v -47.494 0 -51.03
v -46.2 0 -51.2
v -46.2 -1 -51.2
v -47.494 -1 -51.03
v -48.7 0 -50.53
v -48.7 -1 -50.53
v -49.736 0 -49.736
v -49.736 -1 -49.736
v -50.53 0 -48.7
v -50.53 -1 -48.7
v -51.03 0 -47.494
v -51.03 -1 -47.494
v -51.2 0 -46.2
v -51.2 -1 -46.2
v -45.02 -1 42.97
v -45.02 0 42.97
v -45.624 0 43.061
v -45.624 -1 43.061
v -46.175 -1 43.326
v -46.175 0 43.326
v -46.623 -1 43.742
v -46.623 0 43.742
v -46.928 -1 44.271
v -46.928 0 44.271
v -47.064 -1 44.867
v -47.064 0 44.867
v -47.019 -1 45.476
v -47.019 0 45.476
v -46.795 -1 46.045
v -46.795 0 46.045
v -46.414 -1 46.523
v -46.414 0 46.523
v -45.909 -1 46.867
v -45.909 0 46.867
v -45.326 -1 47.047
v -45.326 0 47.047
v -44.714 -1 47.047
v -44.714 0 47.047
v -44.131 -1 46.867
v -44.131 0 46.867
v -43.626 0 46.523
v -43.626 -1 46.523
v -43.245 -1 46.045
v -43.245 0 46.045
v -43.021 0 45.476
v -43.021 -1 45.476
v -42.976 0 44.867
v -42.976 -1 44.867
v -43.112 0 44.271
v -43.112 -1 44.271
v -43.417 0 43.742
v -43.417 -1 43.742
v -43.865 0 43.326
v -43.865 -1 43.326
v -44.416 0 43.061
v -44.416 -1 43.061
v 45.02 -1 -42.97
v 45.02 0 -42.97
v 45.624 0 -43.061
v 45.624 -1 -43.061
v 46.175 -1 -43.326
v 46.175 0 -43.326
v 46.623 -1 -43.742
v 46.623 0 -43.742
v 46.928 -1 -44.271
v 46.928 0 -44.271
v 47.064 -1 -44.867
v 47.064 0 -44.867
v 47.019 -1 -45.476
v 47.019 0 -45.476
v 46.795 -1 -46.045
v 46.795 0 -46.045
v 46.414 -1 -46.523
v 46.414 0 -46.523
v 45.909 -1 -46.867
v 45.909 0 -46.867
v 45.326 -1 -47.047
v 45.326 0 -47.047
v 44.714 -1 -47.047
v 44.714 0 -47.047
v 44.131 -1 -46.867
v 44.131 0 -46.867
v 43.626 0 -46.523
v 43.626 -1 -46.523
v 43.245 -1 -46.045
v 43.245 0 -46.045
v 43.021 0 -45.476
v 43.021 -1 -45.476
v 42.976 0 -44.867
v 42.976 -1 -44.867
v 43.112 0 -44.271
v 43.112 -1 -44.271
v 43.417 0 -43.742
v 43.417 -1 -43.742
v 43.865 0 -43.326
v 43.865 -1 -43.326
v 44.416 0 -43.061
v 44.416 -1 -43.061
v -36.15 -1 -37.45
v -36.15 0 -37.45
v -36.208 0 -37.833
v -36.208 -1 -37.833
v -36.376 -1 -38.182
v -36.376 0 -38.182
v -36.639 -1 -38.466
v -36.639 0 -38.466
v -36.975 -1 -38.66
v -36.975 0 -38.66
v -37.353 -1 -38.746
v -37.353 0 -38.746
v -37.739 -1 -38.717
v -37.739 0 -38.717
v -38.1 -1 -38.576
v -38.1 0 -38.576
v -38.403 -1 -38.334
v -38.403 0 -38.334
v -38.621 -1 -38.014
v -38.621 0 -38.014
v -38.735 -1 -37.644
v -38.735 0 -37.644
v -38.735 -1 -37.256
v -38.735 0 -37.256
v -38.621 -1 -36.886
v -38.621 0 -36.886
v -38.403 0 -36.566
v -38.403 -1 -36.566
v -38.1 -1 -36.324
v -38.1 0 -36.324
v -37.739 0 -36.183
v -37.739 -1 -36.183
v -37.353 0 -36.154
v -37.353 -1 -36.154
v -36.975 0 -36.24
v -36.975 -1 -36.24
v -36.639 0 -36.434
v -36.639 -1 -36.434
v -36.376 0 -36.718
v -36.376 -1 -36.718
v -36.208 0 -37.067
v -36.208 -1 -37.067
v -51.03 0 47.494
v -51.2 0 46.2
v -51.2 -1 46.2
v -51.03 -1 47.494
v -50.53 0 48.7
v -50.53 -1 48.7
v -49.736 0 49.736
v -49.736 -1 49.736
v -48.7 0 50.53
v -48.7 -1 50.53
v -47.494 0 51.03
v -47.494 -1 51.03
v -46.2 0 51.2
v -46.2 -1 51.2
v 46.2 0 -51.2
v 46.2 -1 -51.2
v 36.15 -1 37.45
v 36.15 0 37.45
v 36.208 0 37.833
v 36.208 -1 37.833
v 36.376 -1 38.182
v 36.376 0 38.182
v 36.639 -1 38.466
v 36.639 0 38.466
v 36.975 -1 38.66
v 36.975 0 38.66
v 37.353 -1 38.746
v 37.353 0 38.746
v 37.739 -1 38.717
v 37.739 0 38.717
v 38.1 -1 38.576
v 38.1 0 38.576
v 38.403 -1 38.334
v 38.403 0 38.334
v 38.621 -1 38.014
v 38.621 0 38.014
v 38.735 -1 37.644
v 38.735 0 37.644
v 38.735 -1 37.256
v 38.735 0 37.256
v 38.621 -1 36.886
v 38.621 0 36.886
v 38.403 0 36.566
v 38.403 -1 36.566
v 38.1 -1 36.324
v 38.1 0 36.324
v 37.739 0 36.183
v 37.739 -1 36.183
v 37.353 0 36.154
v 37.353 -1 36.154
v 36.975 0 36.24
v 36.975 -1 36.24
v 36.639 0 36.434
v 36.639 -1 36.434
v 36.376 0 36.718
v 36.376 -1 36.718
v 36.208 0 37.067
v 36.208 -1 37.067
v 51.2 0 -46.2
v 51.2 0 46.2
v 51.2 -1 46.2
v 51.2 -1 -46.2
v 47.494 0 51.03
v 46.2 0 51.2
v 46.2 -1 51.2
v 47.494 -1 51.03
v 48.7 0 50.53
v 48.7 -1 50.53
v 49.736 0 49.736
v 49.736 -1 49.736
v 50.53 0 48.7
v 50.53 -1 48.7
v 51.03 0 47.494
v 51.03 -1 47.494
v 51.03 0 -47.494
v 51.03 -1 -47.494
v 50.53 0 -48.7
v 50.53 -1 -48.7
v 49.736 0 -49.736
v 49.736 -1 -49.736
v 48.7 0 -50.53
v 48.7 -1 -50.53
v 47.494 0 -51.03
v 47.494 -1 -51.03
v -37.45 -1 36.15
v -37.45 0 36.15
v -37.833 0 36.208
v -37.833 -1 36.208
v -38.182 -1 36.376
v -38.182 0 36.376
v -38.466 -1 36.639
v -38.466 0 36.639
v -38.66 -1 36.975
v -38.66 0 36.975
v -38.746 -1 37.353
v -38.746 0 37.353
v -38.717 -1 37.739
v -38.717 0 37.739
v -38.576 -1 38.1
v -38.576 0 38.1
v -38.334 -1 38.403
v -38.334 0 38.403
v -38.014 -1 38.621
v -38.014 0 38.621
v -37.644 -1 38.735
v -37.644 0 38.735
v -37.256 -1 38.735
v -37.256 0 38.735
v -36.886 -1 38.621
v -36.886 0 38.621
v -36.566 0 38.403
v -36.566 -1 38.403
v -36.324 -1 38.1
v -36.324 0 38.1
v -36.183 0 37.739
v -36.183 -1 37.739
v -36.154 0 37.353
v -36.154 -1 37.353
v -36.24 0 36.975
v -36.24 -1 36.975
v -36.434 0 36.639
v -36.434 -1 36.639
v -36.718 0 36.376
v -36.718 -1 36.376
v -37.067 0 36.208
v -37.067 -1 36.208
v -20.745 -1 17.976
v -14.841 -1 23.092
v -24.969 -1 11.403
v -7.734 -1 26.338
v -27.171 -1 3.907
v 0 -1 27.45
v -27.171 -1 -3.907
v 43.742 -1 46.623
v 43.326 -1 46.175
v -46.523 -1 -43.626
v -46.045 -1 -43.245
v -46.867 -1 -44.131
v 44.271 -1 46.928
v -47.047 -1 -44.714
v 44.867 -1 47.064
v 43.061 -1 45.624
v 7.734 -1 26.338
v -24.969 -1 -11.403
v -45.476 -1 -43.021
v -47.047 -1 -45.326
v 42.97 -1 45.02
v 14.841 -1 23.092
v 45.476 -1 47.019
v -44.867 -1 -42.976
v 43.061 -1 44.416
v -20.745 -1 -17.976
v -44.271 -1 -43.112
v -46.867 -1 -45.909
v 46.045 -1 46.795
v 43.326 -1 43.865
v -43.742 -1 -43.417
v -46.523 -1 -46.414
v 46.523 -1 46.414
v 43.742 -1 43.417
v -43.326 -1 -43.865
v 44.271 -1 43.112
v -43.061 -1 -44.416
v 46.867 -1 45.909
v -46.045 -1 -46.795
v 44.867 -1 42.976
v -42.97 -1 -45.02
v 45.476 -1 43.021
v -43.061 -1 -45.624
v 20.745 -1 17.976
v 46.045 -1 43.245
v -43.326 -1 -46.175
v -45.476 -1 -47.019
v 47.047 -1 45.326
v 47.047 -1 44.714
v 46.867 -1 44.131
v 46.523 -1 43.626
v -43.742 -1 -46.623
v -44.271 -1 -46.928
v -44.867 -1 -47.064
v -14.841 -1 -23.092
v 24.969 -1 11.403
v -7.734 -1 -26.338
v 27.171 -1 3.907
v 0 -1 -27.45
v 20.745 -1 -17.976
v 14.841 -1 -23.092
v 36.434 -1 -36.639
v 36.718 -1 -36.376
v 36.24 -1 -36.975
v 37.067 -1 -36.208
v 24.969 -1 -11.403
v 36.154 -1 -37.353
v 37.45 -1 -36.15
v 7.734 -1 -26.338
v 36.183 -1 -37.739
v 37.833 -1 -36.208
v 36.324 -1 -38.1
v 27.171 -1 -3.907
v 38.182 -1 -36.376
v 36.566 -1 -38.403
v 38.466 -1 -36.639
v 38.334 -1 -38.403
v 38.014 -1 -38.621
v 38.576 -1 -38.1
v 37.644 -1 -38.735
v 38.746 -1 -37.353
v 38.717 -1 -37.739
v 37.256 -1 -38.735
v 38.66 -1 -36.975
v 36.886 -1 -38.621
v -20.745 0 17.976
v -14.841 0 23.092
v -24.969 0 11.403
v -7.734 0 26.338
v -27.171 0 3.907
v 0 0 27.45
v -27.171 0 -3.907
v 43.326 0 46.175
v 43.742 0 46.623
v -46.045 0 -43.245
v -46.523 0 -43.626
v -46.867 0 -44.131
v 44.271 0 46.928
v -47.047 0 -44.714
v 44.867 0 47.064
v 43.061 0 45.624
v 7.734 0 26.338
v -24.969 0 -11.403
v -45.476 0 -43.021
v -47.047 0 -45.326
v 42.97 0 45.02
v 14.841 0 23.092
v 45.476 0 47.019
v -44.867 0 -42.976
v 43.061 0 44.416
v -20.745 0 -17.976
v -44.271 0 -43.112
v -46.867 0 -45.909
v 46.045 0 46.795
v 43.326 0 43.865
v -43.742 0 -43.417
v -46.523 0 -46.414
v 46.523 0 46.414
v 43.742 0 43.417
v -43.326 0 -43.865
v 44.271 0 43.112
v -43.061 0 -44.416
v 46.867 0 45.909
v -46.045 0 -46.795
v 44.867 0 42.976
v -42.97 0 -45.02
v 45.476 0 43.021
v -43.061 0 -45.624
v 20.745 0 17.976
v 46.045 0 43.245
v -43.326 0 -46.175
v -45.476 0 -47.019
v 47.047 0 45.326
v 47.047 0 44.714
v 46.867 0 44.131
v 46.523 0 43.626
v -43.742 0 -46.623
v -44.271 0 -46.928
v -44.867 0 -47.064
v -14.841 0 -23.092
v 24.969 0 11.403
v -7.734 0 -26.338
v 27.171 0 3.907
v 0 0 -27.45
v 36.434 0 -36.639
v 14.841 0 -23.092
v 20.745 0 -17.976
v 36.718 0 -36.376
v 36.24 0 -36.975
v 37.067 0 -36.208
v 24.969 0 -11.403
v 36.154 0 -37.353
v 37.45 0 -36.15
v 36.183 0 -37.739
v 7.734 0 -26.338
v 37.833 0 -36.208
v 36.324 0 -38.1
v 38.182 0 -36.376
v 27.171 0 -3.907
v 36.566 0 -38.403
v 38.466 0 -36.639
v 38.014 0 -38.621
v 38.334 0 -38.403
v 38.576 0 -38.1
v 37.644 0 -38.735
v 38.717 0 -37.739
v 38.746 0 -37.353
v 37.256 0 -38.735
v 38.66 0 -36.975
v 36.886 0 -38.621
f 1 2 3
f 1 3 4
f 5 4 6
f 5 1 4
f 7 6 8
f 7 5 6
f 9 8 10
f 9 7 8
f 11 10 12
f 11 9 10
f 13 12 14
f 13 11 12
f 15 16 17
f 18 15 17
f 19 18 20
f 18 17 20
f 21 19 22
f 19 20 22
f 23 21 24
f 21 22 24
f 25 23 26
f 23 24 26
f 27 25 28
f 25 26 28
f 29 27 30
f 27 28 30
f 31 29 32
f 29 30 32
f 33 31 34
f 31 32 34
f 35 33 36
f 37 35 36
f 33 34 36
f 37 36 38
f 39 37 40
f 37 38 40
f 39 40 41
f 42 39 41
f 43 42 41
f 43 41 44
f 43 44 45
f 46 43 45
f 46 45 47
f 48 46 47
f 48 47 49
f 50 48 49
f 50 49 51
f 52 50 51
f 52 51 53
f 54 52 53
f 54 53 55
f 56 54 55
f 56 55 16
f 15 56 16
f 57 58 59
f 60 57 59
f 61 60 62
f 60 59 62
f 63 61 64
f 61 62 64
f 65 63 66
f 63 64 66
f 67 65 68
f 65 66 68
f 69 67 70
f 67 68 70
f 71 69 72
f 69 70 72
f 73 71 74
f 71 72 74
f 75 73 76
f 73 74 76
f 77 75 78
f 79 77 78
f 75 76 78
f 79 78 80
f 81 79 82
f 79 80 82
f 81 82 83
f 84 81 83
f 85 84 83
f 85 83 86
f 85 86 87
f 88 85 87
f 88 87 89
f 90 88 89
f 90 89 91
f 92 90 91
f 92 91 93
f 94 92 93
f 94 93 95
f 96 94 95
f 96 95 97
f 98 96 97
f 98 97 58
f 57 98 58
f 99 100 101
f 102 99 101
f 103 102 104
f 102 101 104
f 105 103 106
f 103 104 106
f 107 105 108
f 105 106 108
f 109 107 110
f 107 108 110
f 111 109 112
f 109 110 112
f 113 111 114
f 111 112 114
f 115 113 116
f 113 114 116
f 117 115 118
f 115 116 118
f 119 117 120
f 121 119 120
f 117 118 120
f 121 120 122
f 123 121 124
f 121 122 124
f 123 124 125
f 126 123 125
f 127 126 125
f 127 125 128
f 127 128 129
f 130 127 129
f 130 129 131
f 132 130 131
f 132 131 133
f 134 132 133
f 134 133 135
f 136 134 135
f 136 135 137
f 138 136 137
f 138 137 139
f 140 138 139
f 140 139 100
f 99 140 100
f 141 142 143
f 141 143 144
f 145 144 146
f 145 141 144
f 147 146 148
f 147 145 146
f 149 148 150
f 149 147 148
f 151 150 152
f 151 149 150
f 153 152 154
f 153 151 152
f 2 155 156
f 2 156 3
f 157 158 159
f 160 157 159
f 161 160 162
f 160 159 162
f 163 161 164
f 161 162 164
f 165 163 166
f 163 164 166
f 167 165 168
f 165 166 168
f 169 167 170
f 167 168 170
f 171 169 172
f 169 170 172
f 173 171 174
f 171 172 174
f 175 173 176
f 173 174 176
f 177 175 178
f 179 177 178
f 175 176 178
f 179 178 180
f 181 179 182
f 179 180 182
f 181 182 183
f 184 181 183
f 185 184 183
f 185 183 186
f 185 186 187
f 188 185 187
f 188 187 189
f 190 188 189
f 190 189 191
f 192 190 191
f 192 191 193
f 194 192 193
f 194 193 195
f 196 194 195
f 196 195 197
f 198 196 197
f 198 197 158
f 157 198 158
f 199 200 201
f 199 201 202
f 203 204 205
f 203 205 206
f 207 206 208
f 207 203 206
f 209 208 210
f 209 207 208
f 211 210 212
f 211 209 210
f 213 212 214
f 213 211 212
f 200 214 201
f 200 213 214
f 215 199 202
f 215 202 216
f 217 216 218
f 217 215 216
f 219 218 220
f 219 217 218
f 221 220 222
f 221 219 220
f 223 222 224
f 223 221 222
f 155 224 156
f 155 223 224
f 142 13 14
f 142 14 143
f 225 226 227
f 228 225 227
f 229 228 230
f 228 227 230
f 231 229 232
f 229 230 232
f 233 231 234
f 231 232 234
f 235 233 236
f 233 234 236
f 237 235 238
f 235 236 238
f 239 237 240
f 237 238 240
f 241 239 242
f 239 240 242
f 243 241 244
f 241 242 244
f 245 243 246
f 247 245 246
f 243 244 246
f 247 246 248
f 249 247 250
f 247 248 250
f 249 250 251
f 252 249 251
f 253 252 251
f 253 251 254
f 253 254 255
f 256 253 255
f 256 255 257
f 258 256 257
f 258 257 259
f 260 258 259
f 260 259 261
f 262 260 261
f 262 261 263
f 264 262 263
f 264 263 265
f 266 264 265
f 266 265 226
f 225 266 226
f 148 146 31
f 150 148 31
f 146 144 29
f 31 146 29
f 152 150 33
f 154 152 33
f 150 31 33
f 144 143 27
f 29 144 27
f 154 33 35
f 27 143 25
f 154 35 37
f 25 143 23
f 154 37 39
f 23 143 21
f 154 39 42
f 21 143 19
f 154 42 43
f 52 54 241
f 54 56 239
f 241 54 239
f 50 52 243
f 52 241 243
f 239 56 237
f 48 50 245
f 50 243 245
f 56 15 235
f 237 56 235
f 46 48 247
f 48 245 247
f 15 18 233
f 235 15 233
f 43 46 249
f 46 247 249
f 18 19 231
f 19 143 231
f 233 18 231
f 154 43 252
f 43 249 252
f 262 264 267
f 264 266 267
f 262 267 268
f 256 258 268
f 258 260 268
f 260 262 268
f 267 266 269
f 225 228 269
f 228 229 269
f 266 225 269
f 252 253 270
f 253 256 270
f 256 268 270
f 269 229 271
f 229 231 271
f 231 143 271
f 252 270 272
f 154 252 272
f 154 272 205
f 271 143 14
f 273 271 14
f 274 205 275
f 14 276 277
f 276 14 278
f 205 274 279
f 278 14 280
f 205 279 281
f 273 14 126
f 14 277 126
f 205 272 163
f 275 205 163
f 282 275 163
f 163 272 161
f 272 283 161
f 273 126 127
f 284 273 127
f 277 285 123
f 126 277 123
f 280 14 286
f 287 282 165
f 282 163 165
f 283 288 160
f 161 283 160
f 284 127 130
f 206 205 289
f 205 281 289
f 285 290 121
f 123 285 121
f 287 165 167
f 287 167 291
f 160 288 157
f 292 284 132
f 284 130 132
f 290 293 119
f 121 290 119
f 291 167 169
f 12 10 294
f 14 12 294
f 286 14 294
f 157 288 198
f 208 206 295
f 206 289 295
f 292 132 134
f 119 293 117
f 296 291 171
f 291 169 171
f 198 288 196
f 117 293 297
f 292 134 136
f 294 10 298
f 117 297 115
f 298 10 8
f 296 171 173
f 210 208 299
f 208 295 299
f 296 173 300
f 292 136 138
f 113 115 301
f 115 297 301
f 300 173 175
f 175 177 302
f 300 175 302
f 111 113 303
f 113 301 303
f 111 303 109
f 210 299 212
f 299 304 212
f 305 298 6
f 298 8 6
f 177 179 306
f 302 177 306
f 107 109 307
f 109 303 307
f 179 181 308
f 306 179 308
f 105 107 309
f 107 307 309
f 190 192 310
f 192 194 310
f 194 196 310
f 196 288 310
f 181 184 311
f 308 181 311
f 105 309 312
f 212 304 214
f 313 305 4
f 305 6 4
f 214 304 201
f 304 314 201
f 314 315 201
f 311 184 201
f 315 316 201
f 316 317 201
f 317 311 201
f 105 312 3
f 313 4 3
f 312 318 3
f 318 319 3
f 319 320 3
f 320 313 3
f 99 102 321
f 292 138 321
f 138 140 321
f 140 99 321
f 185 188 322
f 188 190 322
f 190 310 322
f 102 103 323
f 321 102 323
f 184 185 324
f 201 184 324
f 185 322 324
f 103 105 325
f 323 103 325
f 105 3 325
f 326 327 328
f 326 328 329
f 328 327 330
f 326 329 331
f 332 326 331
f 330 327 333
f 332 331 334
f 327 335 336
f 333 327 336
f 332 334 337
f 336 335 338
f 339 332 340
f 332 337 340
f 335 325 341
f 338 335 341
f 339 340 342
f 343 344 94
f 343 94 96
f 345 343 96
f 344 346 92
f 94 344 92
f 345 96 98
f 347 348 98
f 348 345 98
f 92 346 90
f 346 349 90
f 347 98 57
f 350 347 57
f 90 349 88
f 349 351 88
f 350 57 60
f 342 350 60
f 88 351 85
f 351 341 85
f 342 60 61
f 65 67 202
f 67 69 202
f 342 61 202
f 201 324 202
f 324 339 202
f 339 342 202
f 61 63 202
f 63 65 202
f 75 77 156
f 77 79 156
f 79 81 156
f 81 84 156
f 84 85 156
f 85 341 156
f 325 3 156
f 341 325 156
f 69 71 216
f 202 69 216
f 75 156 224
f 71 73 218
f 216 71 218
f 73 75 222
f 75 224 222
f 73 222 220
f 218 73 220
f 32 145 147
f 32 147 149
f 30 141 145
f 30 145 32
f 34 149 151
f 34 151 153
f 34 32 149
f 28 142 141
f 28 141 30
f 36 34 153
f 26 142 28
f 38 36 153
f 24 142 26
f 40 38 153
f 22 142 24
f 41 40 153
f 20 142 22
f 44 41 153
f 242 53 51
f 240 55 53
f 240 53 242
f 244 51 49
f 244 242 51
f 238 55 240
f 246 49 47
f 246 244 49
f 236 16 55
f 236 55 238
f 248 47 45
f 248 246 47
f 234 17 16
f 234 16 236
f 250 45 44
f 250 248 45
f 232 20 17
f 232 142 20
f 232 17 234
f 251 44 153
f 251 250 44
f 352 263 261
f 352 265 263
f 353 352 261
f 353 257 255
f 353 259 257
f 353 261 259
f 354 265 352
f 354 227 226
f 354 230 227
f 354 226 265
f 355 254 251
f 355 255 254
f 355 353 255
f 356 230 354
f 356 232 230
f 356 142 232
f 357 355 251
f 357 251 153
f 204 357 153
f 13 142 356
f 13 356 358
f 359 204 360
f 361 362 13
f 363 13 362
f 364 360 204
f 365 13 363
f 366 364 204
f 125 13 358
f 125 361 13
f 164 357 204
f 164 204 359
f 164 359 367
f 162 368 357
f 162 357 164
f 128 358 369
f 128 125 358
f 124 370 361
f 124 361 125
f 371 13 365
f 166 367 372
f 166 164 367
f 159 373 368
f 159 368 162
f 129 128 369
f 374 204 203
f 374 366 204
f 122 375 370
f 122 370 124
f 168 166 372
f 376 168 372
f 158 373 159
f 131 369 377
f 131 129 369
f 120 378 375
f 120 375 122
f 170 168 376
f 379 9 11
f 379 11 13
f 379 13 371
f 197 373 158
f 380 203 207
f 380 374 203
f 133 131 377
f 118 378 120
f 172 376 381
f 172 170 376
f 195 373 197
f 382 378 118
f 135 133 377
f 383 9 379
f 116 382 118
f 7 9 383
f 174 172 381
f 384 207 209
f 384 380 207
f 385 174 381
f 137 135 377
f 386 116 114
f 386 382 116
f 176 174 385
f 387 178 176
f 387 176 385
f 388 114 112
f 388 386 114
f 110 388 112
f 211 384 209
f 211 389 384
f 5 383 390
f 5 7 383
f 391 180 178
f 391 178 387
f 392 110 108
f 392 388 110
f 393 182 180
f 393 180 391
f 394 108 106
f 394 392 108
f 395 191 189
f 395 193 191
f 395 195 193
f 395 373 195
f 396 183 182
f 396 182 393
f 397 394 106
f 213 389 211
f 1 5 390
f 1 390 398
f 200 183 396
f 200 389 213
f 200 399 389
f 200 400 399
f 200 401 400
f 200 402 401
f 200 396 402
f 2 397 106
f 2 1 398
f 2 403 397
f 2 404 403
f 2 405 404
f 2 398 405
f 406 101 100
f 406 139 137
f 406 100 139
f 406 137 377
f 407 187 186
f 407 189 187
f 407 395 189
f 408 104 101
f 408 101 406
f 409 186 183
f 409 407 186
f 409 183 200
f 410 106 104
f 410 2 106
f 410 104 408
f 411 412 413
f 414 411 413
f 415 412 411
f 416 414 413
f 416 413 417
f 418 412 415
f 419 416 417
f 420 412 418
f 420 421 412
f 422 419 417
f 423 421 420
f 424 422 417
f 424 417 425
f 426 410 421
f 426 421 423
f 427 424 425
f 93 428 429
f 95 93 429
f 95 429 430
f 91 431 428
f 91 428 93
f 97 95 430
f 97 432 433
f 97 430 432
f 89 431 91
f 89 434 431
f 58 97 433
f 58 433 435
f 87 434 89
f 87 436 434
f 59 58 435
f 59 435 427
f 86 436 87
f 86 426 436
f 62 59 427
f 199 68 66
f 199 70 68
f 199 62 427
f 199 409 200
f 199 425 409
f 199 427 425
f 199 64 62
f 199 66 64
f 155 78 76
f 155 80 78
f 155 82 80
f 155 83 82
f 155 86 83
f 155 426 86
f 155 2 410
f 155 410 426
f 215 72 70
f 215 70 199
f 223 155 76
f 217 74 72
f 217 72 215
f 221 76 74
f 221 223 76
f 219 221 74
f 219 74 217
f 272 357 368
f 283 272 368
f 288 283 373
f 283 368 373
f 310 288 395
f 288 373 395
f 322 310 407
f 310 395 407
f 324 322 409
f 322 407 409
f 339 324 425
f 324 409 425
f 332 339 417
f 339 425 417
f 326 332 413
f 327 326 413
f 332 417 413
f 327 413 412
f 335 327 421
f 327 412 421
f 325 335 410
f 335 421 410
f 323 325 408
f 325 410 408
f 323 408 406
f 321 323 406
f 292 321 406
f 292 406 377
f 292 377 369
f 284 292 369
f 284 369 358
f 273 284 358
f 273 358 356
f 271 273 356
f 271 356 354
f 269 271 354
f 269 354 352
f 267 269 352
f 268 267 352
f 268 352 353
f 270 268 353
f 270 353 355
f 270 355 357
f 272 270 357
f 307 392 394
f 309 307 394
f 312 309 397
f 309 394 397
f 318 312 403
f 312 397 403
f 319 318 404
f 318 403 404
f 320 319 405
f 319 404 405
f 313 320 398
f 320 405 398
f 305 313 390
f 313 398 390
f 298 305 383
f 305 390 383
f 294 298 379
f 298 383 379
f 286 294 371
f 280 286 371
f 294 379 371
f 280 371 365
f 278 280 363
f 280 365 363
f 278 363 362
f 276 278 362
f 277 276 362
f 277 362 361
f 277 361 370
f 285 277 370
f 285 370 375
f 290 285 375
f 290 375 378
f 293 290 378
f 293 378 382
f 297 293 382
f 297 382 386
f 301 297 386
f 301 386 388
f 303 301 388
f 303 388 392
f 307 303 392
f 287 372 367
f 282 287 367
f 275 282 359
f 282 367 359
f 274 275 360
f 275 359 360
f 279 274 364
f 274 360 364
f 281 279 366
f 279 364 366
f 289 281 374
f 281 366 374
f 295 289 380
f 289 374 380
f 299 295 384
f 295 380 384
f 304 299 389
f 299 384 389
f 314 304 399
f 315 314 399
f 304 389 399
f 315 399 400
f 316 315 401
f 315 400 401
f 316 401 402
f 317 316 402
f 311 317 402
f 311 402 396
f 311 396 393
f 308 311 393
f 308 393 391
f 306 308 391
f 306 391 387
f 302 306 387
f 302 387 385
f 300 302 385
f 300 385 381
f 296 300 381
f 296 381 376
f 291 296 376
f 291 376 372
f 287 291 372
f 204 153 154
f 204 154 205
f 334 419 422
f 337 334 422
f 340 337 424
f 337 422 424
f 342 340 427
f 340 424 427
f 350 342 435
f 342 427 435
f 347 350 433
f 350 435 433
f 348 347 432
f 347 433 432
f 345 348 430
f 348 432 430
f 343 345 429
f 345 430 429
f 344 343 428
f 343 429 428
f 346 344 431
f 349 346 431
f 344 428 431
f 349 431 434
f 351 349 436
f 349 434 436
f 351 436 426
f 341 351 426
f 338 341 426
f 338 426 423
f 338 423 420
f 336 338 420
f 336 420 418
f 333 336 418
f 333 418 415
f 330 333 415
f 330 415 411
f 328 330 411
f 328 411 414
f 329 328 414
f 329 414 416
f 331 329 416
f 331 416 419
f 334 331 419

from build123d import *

# Parameters (mm, degrees)
BASE_FLANGE1_DEPTH = 1
SKETCH6_R          = 27.45
CUT_EXTRUDE1_DEPTH = 10
SKETCH8_R          = 2.05
SKETCH8_R_2        = 1.3
CUT_EXTRUDE3_DEPTH = 10
CIRPATTERN2_COUNT  = 4


# Sheet-metal steps are written as plain solids
with BuildPart() as part:
    # Sketch1 → Base-Flange1 (new body)
    with BuildSketch(Plane(origin=(0, 0, 0), x_dir=(1, 0, 0), z_dir=(0, 1, 0))):
        with BuildLine():
            Line((-46.2, -51.2), (46.2, -51.2))
            ThreePointArc((46.2, -51.2), (49.735533906, -49.735533906), (51.2, -46.2))
            Line((51.2, -46.2), (51.2, 46.2))
            ThreePointArc((51.2, 46.2), (49.735533906, 49.735533906), (46.2, 51.2))
            Line((46.2, 51.2), (-46.2, 51.2))
            ThreePointArc((-46.2, 51.2), (-49.735533906, 49.735533906), (-51.2, 46.2))
            Line((-51.2, 46.2), (-51.2, -46.2))
            ThreePointArc((-51.2, -46.2), (-49.735533906, -49.735533906), (-46.2, -51.2))
        make_face()
    extrude(amount=-BASE_FLANGE1_DEPTH)

    # Sketch6 → Cut-Extrude1 (cut)
    with BuildSketch(Plane(origin=(0, 0, 0), x_dir=(1, 0, 0), z_dir=(0, 1, 0))):
        with Locations(Location((0, 0, 0), (0, 0, 270))):
            Circle(SKETCH6_R)
    extrude(amount=-CUT_EXTRUDE1_DEPTH, mode=Mode.SUBTRACT)

    # Sketch8 → Cut-Extrude3 (cut)
    with BuildSketch(Plane(origin=(0, 0, 0), x_dir=(1, 0, 0), z_dir=(0, 1, 0))):
        with Locations(Location((45.02, 45.02, 0), (0, 0, 270))):
            Circle(SKETCH8_R)
        with Locations(Location((37.45, 37.45, 0), (0, 0, 270))):
            Circle(SKETCH8_R_2)
    cut_extrude3 = extrude(amount=-CUT_EXTRUDE3_DEPTH, mode=Mode.SUBTRACT)

    # CirPattern2: Cut-Extrude3 ×4 about axis
    cirpattern2_axis = Axis((0, 0, 0), (0, 1, 0))
    for i in range(1, CIRPATTERN2_COUNT):
        add(cut_extrude3.rotate(cirpattern2_axis, i * 360 / CIRPATTERN2_COUNT), mode=Mode.SUBTRACT)


solid = part.part
